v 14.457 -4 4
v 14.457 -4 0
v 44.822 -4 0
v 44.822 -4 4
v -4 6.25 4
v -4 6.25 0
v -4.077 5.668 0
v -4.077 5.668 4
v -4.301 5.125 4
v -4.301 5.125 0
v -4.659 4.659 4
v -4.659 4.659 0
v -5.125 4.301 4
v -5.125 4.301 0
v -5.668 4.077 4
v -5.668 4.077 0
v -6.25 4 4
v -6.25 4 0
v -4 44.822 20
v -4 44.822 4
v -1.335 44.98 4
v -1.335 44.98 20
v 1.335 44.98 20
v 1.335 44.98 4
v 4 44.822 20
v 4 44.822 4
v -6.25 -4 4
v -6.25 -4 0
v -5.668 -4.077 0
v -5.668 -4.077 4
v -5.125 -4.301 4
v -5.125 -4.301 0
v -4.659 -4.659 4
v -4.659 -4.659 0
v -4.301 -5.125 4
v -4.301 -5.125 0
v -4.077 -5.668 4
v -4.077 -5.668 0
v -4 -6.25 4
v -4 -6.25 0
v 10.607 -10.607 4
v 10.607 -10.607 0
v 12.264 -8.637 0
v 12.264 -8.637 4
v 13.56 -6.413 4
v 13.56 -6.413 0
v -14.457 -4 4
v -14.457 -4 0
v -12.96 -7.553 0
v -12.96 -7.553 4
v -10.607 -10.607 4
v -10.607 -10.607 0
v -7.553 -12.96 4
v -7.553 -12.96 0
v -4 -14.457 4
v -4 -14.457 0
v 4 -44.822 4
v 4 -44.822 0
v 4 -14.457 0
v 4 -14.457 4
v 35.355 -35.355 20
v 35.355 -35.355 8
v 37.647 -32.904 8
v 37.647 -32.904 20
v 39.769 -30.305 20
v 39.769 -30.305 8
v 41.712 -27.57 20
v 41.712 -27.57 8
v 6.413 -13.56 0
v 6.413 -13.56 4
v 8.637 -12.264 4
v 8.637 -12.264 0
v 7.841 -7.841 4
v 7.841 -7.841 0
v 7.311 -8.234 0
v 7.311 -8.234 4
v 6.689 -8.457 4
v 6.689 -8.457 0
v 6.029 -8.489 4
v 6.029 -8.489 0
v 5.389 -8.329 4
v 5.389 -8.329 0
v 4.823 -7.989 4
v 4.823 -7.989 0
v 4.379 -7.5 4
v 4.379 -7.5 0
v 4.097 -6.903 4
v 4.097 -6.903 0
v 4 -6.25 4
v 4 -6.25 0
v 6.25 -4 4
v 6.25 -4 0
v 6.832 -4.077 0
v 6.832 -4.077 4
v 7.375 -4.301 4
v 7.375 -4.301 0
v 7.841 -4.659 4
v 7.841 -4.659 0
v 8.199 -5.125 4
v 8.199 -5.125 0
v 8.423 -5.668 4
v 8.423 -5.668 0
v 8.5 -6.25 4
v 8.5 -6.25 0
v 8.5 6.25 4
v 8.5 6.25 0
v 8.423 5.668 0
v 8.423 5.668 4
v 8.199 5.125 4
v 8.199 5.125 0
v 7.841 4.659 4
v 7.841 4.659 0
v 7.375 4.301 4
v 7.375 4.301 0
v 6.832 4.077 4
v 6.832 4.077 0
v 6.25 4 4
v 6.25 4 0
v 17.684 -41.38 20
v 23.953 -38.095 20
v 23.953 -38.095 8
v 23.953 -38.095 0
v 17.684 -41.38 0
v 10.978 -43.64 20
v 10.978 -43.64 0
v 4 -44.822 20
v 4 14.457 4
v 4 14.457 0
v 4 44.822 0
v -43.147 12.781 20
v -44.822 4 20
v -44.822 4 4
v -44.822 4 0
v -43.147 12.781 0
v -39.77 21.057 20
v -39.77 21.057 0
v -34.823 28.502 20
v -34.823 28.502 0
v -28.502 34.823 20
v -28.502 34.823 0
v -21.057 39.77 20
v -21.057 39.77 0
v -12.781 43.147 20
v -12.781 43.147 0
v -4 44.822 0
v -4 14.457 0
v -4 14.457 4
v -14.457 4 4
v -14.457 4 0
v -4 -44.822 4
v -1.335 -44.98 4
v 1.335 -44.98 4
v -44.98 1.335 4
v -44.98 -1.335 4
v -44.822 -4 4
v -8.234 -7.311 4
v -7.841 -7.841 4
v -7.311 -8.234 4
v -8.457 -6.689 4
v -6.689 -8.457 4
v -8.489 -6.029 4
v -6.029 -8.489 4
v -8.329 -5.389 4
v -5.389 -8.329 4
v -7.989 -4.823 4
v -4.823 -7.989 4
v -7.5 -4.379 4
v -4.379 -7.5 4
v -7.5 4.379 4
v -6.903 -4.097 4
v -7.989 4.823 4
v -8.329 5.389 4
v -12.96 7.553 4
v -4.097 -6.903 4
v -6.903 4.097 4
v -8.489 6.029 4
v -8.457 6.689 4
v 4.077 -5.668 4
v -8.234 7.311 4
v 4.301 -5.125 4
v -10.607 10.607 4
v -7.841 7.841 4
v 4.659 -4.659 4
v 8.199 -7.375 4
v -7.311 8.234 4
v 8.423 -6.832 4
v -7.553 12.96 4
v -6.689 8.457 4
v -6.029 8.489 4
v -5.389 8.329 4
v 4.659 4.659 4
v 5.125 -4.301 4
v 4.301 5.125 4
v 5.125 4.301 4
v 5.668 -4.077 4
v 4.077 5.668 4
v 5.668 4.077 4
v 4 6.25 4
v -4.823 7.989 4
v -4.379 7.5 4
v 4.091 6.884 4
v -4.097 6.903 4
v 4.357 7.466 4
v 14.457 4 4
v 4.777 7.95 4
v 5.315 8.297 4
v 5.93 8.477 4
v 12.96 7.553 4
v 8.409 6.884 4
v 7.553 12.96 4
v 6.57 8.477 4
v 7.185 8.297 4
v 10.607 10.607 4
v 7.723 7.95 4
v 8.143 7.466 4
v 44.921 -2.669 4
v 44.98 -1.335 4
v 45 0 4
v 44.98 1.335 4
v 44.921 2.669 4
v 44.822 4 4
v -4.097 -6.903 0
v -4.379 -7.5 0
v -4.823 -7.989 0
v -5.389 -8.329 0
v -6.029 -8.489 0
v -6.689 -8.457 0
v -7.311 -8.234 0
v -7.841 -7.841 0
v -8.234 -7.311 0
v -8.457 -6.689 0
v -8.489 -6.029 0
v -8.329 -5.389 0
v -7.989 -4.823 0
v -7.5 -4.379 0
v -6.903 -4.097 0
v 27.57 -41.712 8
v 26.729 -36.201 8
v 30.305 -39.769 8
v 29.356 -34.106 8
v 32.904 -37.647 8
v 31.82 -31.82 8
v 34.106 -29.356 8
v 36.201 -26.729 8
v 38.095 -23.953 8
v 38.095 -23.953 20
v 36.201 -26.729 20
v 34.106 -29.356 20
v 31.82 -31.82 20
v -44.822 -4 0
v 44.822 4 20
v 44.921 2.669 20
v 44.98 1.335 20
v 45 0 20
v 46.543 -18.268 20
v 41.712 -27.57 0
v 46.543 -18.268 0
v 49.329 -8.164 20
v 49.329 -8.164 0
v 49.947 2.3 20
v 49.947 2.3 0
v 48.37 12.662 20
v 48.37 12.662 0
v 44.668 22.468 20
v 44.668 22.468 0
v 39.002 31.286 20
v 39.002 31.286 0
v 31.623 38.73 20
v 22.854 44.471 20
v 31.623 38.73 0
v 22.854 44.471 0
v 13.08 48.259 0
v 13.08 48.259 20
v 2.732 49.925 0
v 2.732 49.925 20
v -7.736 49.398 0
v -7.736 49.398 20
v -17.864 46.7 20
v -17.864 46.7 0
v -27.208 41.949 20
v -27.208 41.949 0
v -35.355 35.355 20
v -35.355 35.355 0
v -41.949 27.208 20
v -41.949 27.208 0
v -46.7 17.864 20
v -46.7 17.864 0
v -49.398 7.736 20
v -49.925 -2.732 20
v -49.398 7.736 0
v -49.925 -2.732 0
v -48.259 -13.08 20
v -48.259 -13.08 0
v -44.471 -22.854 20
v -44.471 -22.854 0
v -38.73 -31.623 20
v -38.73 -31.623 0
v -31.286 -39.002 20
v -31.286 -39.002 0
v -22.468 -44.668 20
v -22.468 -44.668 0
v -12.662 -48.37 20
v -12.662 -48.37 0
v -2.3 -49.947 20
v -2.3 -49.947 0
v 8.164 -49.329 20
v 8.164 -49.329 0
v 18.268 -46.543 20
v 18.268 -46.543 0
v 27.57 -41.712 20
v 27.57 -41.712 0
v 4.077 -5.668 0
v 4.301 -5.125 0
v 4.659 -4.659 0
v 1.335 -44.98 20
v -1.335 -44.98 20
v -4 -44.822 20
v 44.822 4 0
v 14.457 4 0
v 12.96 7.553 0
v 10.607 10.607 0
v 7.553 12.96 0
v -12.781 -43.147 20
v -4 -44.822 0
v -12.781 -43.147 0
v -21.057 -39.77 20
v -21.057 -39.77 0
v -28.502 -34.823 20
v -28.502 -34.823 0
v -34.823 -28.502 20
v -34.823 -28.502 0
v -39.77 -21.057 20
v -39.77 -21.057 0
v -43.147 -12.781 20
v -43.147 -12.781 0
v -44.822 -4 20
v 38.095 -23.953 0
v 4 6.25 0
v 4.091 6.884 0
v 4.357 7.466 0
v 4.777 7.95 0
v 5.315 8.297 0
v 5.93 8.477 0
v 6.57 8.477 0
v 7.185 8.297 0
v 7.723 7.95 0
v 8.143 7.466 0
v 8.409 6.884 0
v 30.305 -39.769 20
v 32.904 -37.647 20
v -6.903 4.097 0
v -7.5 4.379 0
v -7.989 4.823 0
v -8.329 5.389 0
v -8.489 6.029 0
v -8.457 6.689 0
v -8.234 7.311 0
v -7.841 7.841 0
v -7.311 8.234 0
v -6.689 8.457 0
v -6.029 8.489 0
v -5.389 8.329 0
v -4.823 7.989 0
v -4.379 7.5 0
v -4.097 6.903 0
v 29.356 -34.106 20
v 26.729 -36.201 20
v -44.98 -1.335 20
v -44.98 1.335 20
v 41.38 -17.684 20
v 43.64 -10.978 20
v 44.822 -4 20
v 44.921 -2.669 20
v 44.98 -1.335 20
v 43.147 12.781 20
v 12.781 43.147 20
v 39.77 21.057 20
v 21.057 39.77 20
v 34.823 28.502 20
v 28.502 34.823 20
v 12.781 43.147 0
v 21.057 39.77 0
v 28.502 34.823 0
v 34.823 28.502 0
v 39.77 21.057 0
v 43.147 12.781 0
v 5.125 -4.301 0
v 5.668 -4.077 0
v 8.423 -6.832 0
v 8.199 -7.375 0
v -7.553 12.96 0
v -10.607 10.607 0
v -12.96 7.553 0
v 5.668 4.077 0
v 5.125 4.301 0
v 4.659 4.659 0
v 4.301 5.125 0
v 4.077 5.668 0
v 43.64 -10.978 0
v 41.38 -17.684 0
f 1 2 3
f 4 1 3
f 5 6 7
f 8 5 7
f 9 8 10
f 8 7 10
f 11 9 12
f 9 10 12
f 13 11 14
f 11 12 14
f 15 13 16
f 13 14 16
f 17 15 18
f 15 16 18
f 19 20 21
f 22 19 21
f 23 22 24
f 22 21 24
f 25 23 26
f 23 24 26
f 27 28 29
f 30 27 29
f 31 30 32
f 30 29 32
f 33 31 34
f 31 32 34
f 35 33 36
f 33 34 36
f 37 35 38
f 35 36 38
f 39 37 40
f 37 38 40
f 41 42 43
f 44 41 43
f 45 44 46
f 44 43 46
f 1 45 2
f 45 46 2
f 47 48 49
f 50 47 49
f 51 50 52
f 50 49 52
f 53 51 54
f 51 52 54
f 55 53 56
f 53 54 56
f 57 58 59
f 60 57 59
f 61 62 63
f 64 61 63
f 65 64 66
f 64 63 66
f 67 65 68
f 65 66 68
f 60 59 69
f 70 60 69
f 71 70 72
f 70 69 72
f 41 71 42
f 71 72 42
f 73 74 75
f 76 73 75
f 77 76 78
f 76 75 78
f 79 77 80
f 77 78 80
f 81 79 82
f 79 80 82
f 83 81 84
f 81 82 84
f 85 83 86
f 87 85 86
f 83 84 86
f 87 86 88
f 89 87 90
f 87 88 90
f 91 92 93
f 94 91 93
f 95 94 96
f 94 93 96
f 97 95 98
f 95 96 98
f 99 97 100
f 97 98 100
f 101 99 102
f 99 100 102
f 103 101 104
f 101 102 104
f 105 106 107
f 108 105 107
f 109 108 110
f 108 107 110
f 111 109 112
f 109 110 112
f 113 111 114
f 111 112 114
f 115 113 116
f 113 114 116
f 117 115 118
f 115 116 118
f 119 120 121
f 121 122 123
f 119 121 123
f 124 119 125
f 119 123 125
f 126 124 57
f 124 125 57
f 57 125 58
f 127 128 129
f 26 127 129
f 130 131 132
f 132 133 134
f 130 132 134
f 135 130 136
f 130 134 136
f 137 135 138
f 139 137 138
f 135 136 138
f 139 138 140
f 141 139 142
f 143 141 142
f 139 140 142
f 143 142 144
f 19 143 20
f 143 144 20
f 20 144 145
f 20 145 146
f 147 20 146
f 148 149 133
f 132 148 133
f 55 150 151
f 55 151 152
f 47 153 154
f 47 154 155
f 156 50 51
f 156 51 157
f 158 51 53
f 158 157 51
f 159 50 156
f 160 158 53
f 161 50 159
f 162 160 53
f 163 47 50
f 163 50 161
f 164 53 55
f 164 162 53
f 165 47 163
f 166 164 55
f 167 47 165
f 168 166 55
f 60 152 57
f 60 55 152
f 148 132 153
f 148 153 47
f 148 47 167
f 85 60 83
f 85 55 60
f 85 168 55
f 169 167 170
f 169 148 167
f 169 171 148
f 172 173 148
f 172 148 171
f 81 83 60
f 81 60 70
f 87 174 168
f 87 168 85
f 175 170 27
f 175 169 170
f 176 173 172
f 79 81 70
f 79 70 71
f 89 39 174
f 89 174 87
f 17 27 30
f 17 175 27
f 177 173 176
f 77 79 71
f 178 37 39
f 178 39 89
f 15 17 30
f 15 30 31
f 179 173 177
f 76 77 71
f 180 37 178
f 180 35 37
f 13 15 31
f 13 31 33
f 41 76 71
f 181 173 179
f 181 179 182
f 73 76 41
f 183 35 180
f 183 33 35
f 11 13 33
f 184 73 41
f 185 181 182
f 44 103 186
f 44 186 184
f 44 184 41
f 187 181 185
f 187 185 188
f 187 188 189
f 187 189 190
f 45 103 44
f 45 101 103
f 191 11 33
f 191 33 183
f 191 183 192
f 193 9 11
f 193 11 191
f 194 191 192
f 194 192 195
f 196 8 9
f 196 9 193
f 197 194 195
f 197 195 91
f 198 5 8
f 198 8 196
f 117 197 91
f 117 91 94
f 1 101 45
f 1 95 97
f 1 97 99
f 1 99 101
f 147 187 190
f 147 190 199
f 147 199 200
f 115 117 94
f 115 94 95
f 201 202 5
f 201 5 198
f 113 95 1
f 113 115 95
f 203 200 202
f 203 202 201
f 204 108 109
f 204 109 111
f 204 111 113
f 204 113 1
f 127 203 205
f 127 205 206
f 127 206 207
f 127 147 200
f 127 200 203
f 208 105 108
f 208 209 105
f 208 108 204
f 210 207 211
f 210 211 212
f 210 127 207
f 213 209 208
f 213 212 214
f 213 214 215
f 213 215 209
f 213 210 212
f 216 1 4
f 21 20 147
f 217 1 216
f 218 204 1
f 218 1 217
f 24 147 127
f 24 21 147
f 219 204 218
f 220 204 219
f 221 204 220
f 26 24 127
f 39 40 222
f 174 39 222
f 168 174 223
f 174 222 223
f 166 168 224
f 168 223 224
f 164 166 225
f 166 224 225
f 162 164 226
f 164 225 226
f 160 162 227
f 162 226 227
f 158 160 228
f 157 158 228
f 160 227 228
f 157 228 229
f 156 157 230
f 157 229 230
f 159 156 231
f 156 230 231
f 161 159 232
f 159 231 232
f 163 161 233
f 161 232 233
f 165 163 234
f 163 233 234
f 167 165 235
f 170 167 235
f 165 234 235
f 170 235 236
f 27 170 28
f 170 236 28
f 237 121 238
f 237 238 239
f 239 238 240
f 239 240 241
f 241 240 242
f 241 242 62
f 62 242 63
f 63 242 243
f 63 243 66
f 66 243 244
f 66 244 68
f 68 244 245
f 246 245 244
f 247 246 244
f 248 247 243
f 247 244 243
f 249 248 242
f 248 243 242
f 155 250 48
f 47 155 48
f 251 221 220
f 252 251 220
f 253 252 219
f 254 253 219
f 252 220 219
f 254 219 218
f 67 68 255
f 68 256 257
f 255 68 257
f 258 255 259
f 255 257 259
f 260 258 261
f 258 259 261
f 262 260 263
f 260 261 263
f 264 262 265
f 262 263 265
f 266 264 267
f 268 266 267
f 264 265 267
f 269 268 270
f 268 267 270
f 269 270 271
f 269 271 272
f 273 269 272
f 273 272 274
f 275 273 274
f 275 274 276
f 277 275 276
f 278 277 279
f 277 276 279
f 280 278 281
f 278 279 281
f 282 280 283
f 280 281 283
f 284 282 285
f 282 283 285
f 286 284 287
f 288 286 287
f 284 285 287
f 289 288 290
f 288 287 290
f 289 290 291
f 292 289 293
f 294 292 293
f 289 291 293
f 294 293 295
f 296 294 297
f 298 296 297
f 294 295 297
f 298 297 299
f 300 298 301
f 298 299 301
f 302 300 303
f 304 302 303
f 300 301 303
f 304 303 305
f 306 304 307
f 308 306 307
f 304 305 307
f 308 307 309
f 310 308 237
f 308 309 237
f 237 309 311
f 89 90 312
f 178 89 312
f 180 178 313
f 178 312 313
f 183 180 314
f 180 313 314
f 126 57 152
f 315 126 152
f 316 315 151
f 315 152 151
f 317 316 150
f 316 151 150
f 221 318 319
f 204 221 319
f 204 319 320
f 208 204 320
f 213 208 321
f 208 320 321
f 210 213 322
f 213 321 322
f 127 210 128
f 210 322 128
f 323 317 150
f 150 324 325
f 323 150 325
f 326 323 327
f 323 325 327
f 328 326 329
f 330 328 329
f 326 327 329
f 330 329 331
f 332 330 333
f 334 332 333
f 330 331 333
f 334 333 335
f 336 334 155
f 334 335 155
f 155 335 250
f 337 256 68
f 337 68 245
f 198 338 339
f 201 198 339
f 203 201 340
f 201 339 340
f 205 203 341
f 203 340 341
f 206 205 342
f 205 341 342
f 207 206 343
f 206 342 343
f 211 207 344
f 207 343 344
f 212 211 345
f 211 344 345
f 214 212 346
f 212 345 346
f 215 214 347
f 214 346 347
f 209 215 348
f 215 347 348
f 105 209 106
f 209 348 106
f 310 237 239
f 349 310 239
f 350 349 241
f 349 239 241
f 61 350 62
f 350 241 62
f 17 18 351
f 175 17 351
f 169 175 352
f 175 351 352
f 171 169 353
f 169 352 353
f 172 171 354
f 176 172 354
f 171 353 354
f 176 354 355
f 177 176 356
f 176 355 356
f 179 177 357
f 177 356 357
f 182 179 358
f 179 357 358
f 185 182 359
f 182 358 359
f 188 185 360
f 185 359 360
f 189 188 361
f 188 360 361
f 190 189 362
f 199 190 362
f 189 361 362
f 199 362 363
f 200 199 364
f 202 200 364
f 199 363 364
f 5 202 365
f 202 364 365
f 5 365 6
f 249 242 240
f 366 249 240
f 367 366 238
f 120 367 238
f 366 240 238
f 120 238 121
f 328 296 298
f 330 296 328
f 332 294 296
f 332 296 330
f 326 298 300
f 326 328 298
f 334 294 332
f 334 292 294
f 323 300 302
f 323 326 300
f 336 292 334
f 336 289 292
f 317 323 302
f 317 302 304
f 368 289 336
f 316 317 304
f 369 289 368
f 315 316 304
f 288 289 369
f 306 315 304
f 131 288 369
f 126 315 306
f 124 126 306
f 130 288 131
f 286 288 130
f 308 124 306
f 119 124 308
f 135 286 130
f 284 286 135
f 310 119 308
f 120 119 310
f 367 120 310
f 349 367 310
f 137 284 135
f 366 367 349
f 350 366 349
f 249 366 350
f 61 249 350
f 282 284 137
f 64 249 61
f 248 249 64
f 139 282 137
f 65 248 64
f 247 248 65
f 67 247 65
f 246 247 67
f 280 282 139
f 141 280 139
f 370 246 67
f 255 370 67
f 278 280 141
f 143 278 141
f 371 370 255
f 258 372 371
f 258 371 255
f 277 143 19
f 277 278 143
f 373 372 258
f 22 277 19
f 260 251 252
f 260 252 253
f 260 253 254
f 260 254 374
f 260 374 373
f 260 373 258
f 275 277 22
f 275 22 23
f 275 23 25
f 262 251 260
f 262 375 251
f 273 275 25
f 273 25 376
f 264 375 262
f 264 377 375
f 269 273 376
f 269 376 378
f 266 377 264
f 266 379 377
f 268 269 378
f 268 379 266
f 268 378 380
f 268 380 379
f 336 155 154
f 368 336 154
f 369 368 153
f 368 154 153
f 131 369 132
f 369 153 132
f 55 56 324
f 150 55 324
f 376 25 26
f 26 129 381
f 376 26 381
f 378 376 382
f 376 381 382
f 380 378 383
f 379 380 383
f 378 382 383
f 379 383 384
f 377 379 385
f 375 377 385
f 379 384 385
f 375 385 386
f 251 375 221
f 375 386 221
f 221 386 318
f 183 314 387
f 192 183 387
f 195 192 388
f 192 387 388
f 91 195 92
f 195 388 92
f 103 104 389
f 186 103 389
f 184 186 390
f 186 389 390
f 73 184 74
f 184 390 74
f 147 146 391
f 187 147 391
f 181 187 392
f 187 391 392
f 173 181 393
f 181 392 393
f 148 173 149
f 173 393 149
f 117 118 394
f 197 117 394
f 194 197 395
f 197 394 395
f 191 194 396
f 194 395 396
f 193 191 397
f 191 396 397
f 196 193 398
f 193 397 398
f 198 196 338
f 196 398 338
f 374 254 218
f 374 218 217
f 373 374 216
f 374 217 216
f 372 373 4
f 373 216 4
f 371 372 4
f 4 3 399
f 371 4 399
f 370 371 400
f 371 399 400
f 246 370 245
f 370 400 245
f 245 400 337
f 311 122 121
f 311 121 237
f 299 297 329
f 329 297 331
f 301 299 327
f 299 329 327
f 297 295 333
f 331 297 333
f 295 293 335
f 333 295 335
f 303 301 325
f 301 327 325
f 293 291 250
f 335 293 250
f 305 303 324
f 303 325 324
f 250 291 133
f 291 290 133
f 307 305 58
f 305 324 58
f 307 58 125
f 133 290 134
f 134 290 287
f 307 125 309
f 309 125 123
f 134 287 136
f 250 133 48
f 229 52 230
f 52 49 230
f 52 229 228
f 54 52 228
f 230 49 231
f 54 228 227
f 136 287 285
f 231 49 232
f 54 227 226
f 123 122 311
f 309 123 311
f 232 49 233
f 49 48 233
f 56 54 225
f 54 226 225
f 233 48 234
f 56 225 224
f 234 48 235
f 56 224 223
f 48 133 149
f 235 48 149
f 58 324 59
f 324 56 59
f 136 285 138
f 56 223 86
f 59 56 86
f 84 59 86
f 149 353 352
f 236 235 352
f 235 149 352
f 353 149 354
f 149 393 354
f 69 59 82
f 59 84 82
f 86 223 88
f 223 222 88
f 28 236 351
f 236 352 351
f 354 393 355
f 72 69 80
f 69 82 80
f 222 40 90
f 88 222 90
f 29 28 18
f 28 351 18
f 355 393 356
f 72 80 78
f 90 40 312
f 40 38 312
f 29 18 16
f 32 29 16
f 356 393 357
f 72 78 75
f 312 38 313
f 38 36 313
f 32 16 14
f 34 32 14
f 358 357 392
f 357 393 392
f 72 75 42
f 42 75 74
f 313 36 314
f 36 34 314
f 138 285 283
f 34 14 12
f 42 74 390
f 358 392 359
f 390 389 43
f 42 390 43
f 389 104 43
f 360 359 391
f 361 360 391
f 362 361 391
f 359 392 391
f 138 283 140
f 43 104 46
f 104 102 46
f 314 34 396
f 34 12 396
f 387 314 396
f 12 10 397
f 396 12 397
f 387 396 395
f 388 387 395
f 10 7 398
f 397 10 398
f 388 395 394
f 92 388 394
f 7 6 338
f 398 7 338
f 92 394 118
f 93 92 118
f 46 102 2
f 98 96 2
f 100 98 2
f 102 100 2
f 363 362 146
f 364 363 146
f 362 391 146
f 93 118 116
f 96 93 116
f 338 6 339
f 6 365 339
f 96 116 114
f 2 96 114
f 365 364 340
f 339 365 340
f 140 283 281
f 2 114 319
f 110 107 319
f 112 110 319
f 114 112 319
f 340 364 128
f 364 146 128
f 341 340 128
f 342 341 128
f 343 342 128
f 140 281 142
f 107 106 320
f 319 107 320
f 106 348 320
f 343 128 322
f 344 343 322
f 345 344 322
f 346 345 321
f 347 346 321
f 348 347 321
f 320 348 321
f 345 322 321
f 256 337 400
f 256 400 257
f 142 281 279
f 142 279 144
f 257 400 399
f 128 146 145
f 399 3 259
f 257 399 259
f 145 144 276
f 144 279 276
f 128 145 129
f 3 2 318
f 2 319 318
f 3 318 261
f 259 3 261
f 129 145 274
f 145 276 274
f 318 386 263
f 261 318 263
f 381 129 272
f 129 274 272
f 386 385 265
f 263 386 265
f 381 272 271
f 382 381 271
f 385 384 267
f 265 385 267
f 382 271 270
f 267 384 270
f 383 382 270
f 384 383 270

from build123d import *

# Parameters (mm, degrees)
F1_DEPTH = 20
F0_W     = 8
F0_H     = 8
F2_DEPTH = 4
F3_DEPTH = 8


with BuildPart() as f1:
    # F0 (on Top) → F1 (new body)
    with BuildSketch(Plane.XY):
        with BuildLine():
            Line((23.9531163031, -38.0952519268), (27.5699483395, -41.7120839632))
            ThreePointArc((27.5699483395, -41.7120839632), (31.6227766017, -38.7298334621), (35.3553390593, -35.3553390593))
            Line((35.3553390593, -35.3553390593), (31.8198051534, -31.8198051534))
            ThreePointArc((31.8198051534, -31.8198051534), (28.0624304008, -35.1781181987), (23.9531163031, -38.0952519268))
        make_face()
        with BuildLine():
            ThreePointArc((35.3553390593, -35.3553390593), (38.7298334621, -31.6227766017), (41.7120839632, -27.5699483395))
            Line((41.7120839632, -27.5699483395), (38.0952519268, -23.9531163031))
            ThreePointArc((38.0952519268, -23.9531163031), (35.1781181987, -28.0624304008), (31.8198051534, -31.8198051534))
            Line((31.8198051534, -31.8198051534), (35.3553390593, -35.3553390593))
        make_face()
        with BuildLine():
            ThreePointArc((41.7120839632, -27.5699483395), (47.883213124, -14.3943704593), (50, 0))
            ThreePointArc((50, 0), (-44.0369016677, 23.6801877423), (27.5699483395, -41.7120839632))
            Line((27.5699483395, -41.7120839632), (23.9531163031, -38.0952519268))
            ThreePointArc((23.9531163031, -38.0952519268), (14.3755356179, -42.6420446941), (4, -44.821869662))
            ThreePointArc((4, -44.821869662), (0, -45), (-4, -44.821869662))
            ThreePointArc((-4, -44.821869662), (-31.8198051534, -31.8198051534), (-44.821869662, -4))
            ThreePointArc((-44.821869662, -4), (-45, 0), (-44.821869662, 4))
            ThreePointArc((-44.821869662, 4), (-31.8198051534, 31.8198051534), (-4, 44.821869662))
            ThreePointArc((-4, 44.821869662), (0, 45), (4, 44.821869662))
            ThreePointArc((4, 44.821869662), (31.8198051534, 31.8198051534), (44.821869662, 4))
            ThreePointArc((44.821869662, 4), (44.9554453587, 2.0019821688), (45, 0))
            ThreePointArc((45, 0), (44.9554453587, -2.0019821688), (44.821869662, -4))
            ThreePointArc((44.821869662, -4), (42.6420446941, -14.3755356179), (38.0952519268, -23.9531163031))
            Line((38.0952519268, -23.9531163031), (41.7120839632, -27.5699483395))
        make_face()
    extrude(amount=F1_DEPTH)

    # F0 (on Top) → F2 (join)
    with BuildSketch(Plane.XY):
        with BuildLine():
            Line((4, 14.4568322948), (4, 44.821869662))
            ThreePointArc((4, 44.821869662), (0, 45), (-4, 44.821869662))
            Line((-4, 44.821869662), (-4, 14.4568322948))
            ThreePointArc((-4, 14.4568322948), (0, 15), (4, 14.4568322948))
        make_face()
        with BuildLine():
            Line((-4, 4), (4, 4))
            Line((4, 4), (4, 6.25))
            Line((4, 6.25), (4, 14.4568322948))
            ThreePointArc((4, 14.4568322948), (0, 15), (-4, 14.4568322948))
            Line((-4, 14.4568322948), (-4, 6.25))
            Line((-4, 6.25), (-4, 4))
        make_face()
        with BuildLine():
            Line((14.4568322948, -4), (44.821869662, -4))
            ThreePointArc((44.821869662, -4), (44.9554453587, -2.0019821688), (45, 0))
            ThreePointArc((45, 0), (44.9554453587, 2.0019821688), (44.821869662, 4))
            Line((44.821869662, 4), (14.4568322948, 4))
            ThreePointArc((14.4568322948, 4), (14.8635877974, 2.0183552187), (15, 0))
            ThreePointArc((15, 0), (14.8635877974, -2.0183552187), (14.4568322948, -4))
        make_face()
        with BuildLine():
            Line((6.2500000127, 4), (14.4568322948, 4))
            ThreePointArc((14.4568322948, 4), (10.6066017178, 10.6066017178), (4, 14.4568322948))
            Line((4, 14.4568322948), (4, 6.25))
            ThreePointArc((4, 6.25), (6.25, 8.5), (8.5, 6.25))
            ThreePointArc((8.5, 6.25), (7.8409902621, 4.6590097468), (6.2500000127, 4))
        make_face()
        with BuildLine():
            Line((6.2499999791, -4), (14.4568322948, -4))
            ThreePointArc((14.4568322948, -4), (14.8635877974, -2.0183552187), (15, 0))
            ThreePointArc((15, 0), (14.8635877974, 2.0183552187), (14.4568322948, 4))
            Line((14.4568322948, 4), (6.2500000127, 4))
            Line((6.2500000127, 4), (4, 4))
            Line((4, 4), (4, -4))
            Line((4, -4), (6.2499999791, -4))
        make_face()
        with BuildLine():
            Line((4, 6.25), (4, 4))
            Line((4, 4), (6.2500000127, 4))
            ThreePointArc((6.2500000127, 4), (4.6590097468, 4.6590097379), (4, 6.25))
        make_face()
        Rectangle(F0_W, F0_H)
        with BuildLine():
            ThreePointArc((-14.4568322948, 4), (-15, 0), (-14.4568322948, -4))
            Line((-14.4568322948, -4), (-6.2500000209, -4))
            Line((-6.2500000209, -4), (-4, -4))
            Line((-4, -4), (-4, 4))
            Line((-4, 4), (-6.2499999873, 4))
            Line((-6.2499999873, 4), (-14.4568322948, 4))
        make_face()
        with BuildLine():
            ThreePointArc((-4, 14.4568322948), (-10.6066017178, 10.6066017178), (-14.4568322948, 4))
            Line((-14.4568322948, 4), (-6.2499999873, 4))
            ThreePointArc((-6.2499999873, 4), (-7.8409902621, 7.8409902532), (-4, 6.25))
            Line((-4, 6.25), (-4, 14.4568322948))
        make_face()
        with BuildLine():
            ThreePointArc((-14.4568322948, -4), (-10.6066017178, -10.6066017178), (-4, -14.4568322948))
            Line((-4, -14.4568322948), (-4, -6.25))
            ThreePointArc((-4, -6.25), (-7.8409902503, -7.8409902651), (-6.2500000209, -4))
            Line((-6.2500000209, -4), (-14.4568322948, -4))
        make_face()
        with BuildLine():
            Line((4, -4), (4, -6.25))
            ThreePointArc((4, -6.25), (4.1712710518, -5.3889622772), (4.6590097423, -4.6590097423))
            Line((4.6590097423, -4.6590097423), (4, -4))
        make_face()
        with BuildLine():
            ThreePointArc((4, -14.4568322948), (7.5527658715, -12.9597734429), (10.6066017178, -10.6066017178))
            Line((10.6066017178, -10.6066017178), (7.8409902577, -7.8409902577))
            ThreePointArc((7.8409902577, -7.8409902577), (5.3889622772, -8.3287289482), (4, -6.25))
            Line((4, -6.25), (4, -14.4568322948))
        make_face()
        with BuildLine():
            ThreePointArc((-4, -44.821869662), (0, -45), (4, -44.821869662))
            Line((4, -44.821869662), (4, -14.4568322948))
            ThreePointArc((4, -14.4568322948), (0, -15), (-4, -14.4568322948))
            Line((-4, -14.4568322948), (-4, -44.821869662))
        make_face()
        with BuildLine():
            ThreePointArc((-44.821869662, 4), (-45, 0), (-44.821869662, -4))
            Line((-44.821869662, -4), (-14.4568322948, -4))
            ThreePointArc((-14.4568322948, -4), (-15, 0), (-14.4568322948, 4))
            Line((-14.4568322948, 4), (-44.821869662, 4))
        make_face()
        with BuildLine():
            ThreePointArc((-4, -14.4568322948), (0, -15), (4, -14.4568322948))
            Line((4, -14.4568322948), (4, -6.25))
            Line((4, -6.25), (4, -4))
            Line((4, -4), (-4, -4))
            Line((-4, -4), (-4, -6.25))
            Line((-4, -6.25), (-4, -14.4568322948))
        make_face()
        with BuildLine():
            ThreePointArc((-6.2500000209, -4), (-4.6590097497, -4.6590097349), (-4, -6.25))
            Line((-4, -6.25), (-4, -4))
            Line((-4, -4), (-6.2500000209, -4))
        make_face()
        with BuildLine():
            ThreePointArc((-4, 6.25), (-4.6590097379, 4.6590097468), (-6.2499999873, 4))
            Line((-6.2499999873, 4), (-4, 4))
            Line((-4, 4), (-4, 6.25))
        make_face()
        with BuildLine():
            Line((7.8409902577, -7.8409902577), (10.6066017178, -10.6066017178))
            ThreePointArc((10.6066017178, -10.6066017178), (12.9597734429, -7.5527658715), (14.4568322948, -4))
            Line((14.4568322948, -4), (6.2499999791, -4))
            ThreePointArc((6.2499999791, -4), (7.8409902503, -4.6590097349), (8.5, -6.25))
            ThreePointArc((8.5, -6.25), (8.3287289482, -7.1110377228), (7.8409902577, -7.8409902577))
        make_face()
        with BuildLine():
            ThreePointArc((4.6590097423, -4.6590097423), (5.3889622675, -4.1712710559), (6.2499999791, -4))
            Line((6.2499999791, -4), (4, -4))
            Line((4, -4), (4.6590097423, -4.6590097423))
        make_face()
    extrude(amount=F2_DEPTH)

    # F0 (on Top) → F3 (cut)
    with BuildSketch(Plane.XY):
        with BuildLine():
            ThreePointArc((35.3553390593, -35.3553390593), (38.7298334621, -31.6227766017), (41.7120839632, -27.5699483395))
            Line((41.7120839632, -27.5699483395), (38.0952519268, -23.9531163031))
            ThreePointArc((38.0952519268, -23.9531163031), (35.1781181987, -28.0624304008), (31.8198051534, -31.8198051534))
            Line((31.8198051534, -31.8198051534), (35.3553390593, -35.3553390593))
        make_face()
        with BuildLine():
            Line((23.9531163031, -38.0952519268), (27.5699483395, -41.7120839632))
            ThreePointArc((27.5699483395, -41.7120839632), (31.6227766017, -38.7298334621), (35.3553390593, -35.3553390593))
            Line((35.3553390593, -35.3553390593), (31.8198051534, -31.8198051534))
            ThreePointArc((31.8198051534, -31.8198051534), (28.0624304008, -35.1781181987), (23.9531163031, -38.0952519268))
        make_face()
    extrude(amount=F3_DEPTH, mode=Mode.SUBTRACT)


solid = f1.part
